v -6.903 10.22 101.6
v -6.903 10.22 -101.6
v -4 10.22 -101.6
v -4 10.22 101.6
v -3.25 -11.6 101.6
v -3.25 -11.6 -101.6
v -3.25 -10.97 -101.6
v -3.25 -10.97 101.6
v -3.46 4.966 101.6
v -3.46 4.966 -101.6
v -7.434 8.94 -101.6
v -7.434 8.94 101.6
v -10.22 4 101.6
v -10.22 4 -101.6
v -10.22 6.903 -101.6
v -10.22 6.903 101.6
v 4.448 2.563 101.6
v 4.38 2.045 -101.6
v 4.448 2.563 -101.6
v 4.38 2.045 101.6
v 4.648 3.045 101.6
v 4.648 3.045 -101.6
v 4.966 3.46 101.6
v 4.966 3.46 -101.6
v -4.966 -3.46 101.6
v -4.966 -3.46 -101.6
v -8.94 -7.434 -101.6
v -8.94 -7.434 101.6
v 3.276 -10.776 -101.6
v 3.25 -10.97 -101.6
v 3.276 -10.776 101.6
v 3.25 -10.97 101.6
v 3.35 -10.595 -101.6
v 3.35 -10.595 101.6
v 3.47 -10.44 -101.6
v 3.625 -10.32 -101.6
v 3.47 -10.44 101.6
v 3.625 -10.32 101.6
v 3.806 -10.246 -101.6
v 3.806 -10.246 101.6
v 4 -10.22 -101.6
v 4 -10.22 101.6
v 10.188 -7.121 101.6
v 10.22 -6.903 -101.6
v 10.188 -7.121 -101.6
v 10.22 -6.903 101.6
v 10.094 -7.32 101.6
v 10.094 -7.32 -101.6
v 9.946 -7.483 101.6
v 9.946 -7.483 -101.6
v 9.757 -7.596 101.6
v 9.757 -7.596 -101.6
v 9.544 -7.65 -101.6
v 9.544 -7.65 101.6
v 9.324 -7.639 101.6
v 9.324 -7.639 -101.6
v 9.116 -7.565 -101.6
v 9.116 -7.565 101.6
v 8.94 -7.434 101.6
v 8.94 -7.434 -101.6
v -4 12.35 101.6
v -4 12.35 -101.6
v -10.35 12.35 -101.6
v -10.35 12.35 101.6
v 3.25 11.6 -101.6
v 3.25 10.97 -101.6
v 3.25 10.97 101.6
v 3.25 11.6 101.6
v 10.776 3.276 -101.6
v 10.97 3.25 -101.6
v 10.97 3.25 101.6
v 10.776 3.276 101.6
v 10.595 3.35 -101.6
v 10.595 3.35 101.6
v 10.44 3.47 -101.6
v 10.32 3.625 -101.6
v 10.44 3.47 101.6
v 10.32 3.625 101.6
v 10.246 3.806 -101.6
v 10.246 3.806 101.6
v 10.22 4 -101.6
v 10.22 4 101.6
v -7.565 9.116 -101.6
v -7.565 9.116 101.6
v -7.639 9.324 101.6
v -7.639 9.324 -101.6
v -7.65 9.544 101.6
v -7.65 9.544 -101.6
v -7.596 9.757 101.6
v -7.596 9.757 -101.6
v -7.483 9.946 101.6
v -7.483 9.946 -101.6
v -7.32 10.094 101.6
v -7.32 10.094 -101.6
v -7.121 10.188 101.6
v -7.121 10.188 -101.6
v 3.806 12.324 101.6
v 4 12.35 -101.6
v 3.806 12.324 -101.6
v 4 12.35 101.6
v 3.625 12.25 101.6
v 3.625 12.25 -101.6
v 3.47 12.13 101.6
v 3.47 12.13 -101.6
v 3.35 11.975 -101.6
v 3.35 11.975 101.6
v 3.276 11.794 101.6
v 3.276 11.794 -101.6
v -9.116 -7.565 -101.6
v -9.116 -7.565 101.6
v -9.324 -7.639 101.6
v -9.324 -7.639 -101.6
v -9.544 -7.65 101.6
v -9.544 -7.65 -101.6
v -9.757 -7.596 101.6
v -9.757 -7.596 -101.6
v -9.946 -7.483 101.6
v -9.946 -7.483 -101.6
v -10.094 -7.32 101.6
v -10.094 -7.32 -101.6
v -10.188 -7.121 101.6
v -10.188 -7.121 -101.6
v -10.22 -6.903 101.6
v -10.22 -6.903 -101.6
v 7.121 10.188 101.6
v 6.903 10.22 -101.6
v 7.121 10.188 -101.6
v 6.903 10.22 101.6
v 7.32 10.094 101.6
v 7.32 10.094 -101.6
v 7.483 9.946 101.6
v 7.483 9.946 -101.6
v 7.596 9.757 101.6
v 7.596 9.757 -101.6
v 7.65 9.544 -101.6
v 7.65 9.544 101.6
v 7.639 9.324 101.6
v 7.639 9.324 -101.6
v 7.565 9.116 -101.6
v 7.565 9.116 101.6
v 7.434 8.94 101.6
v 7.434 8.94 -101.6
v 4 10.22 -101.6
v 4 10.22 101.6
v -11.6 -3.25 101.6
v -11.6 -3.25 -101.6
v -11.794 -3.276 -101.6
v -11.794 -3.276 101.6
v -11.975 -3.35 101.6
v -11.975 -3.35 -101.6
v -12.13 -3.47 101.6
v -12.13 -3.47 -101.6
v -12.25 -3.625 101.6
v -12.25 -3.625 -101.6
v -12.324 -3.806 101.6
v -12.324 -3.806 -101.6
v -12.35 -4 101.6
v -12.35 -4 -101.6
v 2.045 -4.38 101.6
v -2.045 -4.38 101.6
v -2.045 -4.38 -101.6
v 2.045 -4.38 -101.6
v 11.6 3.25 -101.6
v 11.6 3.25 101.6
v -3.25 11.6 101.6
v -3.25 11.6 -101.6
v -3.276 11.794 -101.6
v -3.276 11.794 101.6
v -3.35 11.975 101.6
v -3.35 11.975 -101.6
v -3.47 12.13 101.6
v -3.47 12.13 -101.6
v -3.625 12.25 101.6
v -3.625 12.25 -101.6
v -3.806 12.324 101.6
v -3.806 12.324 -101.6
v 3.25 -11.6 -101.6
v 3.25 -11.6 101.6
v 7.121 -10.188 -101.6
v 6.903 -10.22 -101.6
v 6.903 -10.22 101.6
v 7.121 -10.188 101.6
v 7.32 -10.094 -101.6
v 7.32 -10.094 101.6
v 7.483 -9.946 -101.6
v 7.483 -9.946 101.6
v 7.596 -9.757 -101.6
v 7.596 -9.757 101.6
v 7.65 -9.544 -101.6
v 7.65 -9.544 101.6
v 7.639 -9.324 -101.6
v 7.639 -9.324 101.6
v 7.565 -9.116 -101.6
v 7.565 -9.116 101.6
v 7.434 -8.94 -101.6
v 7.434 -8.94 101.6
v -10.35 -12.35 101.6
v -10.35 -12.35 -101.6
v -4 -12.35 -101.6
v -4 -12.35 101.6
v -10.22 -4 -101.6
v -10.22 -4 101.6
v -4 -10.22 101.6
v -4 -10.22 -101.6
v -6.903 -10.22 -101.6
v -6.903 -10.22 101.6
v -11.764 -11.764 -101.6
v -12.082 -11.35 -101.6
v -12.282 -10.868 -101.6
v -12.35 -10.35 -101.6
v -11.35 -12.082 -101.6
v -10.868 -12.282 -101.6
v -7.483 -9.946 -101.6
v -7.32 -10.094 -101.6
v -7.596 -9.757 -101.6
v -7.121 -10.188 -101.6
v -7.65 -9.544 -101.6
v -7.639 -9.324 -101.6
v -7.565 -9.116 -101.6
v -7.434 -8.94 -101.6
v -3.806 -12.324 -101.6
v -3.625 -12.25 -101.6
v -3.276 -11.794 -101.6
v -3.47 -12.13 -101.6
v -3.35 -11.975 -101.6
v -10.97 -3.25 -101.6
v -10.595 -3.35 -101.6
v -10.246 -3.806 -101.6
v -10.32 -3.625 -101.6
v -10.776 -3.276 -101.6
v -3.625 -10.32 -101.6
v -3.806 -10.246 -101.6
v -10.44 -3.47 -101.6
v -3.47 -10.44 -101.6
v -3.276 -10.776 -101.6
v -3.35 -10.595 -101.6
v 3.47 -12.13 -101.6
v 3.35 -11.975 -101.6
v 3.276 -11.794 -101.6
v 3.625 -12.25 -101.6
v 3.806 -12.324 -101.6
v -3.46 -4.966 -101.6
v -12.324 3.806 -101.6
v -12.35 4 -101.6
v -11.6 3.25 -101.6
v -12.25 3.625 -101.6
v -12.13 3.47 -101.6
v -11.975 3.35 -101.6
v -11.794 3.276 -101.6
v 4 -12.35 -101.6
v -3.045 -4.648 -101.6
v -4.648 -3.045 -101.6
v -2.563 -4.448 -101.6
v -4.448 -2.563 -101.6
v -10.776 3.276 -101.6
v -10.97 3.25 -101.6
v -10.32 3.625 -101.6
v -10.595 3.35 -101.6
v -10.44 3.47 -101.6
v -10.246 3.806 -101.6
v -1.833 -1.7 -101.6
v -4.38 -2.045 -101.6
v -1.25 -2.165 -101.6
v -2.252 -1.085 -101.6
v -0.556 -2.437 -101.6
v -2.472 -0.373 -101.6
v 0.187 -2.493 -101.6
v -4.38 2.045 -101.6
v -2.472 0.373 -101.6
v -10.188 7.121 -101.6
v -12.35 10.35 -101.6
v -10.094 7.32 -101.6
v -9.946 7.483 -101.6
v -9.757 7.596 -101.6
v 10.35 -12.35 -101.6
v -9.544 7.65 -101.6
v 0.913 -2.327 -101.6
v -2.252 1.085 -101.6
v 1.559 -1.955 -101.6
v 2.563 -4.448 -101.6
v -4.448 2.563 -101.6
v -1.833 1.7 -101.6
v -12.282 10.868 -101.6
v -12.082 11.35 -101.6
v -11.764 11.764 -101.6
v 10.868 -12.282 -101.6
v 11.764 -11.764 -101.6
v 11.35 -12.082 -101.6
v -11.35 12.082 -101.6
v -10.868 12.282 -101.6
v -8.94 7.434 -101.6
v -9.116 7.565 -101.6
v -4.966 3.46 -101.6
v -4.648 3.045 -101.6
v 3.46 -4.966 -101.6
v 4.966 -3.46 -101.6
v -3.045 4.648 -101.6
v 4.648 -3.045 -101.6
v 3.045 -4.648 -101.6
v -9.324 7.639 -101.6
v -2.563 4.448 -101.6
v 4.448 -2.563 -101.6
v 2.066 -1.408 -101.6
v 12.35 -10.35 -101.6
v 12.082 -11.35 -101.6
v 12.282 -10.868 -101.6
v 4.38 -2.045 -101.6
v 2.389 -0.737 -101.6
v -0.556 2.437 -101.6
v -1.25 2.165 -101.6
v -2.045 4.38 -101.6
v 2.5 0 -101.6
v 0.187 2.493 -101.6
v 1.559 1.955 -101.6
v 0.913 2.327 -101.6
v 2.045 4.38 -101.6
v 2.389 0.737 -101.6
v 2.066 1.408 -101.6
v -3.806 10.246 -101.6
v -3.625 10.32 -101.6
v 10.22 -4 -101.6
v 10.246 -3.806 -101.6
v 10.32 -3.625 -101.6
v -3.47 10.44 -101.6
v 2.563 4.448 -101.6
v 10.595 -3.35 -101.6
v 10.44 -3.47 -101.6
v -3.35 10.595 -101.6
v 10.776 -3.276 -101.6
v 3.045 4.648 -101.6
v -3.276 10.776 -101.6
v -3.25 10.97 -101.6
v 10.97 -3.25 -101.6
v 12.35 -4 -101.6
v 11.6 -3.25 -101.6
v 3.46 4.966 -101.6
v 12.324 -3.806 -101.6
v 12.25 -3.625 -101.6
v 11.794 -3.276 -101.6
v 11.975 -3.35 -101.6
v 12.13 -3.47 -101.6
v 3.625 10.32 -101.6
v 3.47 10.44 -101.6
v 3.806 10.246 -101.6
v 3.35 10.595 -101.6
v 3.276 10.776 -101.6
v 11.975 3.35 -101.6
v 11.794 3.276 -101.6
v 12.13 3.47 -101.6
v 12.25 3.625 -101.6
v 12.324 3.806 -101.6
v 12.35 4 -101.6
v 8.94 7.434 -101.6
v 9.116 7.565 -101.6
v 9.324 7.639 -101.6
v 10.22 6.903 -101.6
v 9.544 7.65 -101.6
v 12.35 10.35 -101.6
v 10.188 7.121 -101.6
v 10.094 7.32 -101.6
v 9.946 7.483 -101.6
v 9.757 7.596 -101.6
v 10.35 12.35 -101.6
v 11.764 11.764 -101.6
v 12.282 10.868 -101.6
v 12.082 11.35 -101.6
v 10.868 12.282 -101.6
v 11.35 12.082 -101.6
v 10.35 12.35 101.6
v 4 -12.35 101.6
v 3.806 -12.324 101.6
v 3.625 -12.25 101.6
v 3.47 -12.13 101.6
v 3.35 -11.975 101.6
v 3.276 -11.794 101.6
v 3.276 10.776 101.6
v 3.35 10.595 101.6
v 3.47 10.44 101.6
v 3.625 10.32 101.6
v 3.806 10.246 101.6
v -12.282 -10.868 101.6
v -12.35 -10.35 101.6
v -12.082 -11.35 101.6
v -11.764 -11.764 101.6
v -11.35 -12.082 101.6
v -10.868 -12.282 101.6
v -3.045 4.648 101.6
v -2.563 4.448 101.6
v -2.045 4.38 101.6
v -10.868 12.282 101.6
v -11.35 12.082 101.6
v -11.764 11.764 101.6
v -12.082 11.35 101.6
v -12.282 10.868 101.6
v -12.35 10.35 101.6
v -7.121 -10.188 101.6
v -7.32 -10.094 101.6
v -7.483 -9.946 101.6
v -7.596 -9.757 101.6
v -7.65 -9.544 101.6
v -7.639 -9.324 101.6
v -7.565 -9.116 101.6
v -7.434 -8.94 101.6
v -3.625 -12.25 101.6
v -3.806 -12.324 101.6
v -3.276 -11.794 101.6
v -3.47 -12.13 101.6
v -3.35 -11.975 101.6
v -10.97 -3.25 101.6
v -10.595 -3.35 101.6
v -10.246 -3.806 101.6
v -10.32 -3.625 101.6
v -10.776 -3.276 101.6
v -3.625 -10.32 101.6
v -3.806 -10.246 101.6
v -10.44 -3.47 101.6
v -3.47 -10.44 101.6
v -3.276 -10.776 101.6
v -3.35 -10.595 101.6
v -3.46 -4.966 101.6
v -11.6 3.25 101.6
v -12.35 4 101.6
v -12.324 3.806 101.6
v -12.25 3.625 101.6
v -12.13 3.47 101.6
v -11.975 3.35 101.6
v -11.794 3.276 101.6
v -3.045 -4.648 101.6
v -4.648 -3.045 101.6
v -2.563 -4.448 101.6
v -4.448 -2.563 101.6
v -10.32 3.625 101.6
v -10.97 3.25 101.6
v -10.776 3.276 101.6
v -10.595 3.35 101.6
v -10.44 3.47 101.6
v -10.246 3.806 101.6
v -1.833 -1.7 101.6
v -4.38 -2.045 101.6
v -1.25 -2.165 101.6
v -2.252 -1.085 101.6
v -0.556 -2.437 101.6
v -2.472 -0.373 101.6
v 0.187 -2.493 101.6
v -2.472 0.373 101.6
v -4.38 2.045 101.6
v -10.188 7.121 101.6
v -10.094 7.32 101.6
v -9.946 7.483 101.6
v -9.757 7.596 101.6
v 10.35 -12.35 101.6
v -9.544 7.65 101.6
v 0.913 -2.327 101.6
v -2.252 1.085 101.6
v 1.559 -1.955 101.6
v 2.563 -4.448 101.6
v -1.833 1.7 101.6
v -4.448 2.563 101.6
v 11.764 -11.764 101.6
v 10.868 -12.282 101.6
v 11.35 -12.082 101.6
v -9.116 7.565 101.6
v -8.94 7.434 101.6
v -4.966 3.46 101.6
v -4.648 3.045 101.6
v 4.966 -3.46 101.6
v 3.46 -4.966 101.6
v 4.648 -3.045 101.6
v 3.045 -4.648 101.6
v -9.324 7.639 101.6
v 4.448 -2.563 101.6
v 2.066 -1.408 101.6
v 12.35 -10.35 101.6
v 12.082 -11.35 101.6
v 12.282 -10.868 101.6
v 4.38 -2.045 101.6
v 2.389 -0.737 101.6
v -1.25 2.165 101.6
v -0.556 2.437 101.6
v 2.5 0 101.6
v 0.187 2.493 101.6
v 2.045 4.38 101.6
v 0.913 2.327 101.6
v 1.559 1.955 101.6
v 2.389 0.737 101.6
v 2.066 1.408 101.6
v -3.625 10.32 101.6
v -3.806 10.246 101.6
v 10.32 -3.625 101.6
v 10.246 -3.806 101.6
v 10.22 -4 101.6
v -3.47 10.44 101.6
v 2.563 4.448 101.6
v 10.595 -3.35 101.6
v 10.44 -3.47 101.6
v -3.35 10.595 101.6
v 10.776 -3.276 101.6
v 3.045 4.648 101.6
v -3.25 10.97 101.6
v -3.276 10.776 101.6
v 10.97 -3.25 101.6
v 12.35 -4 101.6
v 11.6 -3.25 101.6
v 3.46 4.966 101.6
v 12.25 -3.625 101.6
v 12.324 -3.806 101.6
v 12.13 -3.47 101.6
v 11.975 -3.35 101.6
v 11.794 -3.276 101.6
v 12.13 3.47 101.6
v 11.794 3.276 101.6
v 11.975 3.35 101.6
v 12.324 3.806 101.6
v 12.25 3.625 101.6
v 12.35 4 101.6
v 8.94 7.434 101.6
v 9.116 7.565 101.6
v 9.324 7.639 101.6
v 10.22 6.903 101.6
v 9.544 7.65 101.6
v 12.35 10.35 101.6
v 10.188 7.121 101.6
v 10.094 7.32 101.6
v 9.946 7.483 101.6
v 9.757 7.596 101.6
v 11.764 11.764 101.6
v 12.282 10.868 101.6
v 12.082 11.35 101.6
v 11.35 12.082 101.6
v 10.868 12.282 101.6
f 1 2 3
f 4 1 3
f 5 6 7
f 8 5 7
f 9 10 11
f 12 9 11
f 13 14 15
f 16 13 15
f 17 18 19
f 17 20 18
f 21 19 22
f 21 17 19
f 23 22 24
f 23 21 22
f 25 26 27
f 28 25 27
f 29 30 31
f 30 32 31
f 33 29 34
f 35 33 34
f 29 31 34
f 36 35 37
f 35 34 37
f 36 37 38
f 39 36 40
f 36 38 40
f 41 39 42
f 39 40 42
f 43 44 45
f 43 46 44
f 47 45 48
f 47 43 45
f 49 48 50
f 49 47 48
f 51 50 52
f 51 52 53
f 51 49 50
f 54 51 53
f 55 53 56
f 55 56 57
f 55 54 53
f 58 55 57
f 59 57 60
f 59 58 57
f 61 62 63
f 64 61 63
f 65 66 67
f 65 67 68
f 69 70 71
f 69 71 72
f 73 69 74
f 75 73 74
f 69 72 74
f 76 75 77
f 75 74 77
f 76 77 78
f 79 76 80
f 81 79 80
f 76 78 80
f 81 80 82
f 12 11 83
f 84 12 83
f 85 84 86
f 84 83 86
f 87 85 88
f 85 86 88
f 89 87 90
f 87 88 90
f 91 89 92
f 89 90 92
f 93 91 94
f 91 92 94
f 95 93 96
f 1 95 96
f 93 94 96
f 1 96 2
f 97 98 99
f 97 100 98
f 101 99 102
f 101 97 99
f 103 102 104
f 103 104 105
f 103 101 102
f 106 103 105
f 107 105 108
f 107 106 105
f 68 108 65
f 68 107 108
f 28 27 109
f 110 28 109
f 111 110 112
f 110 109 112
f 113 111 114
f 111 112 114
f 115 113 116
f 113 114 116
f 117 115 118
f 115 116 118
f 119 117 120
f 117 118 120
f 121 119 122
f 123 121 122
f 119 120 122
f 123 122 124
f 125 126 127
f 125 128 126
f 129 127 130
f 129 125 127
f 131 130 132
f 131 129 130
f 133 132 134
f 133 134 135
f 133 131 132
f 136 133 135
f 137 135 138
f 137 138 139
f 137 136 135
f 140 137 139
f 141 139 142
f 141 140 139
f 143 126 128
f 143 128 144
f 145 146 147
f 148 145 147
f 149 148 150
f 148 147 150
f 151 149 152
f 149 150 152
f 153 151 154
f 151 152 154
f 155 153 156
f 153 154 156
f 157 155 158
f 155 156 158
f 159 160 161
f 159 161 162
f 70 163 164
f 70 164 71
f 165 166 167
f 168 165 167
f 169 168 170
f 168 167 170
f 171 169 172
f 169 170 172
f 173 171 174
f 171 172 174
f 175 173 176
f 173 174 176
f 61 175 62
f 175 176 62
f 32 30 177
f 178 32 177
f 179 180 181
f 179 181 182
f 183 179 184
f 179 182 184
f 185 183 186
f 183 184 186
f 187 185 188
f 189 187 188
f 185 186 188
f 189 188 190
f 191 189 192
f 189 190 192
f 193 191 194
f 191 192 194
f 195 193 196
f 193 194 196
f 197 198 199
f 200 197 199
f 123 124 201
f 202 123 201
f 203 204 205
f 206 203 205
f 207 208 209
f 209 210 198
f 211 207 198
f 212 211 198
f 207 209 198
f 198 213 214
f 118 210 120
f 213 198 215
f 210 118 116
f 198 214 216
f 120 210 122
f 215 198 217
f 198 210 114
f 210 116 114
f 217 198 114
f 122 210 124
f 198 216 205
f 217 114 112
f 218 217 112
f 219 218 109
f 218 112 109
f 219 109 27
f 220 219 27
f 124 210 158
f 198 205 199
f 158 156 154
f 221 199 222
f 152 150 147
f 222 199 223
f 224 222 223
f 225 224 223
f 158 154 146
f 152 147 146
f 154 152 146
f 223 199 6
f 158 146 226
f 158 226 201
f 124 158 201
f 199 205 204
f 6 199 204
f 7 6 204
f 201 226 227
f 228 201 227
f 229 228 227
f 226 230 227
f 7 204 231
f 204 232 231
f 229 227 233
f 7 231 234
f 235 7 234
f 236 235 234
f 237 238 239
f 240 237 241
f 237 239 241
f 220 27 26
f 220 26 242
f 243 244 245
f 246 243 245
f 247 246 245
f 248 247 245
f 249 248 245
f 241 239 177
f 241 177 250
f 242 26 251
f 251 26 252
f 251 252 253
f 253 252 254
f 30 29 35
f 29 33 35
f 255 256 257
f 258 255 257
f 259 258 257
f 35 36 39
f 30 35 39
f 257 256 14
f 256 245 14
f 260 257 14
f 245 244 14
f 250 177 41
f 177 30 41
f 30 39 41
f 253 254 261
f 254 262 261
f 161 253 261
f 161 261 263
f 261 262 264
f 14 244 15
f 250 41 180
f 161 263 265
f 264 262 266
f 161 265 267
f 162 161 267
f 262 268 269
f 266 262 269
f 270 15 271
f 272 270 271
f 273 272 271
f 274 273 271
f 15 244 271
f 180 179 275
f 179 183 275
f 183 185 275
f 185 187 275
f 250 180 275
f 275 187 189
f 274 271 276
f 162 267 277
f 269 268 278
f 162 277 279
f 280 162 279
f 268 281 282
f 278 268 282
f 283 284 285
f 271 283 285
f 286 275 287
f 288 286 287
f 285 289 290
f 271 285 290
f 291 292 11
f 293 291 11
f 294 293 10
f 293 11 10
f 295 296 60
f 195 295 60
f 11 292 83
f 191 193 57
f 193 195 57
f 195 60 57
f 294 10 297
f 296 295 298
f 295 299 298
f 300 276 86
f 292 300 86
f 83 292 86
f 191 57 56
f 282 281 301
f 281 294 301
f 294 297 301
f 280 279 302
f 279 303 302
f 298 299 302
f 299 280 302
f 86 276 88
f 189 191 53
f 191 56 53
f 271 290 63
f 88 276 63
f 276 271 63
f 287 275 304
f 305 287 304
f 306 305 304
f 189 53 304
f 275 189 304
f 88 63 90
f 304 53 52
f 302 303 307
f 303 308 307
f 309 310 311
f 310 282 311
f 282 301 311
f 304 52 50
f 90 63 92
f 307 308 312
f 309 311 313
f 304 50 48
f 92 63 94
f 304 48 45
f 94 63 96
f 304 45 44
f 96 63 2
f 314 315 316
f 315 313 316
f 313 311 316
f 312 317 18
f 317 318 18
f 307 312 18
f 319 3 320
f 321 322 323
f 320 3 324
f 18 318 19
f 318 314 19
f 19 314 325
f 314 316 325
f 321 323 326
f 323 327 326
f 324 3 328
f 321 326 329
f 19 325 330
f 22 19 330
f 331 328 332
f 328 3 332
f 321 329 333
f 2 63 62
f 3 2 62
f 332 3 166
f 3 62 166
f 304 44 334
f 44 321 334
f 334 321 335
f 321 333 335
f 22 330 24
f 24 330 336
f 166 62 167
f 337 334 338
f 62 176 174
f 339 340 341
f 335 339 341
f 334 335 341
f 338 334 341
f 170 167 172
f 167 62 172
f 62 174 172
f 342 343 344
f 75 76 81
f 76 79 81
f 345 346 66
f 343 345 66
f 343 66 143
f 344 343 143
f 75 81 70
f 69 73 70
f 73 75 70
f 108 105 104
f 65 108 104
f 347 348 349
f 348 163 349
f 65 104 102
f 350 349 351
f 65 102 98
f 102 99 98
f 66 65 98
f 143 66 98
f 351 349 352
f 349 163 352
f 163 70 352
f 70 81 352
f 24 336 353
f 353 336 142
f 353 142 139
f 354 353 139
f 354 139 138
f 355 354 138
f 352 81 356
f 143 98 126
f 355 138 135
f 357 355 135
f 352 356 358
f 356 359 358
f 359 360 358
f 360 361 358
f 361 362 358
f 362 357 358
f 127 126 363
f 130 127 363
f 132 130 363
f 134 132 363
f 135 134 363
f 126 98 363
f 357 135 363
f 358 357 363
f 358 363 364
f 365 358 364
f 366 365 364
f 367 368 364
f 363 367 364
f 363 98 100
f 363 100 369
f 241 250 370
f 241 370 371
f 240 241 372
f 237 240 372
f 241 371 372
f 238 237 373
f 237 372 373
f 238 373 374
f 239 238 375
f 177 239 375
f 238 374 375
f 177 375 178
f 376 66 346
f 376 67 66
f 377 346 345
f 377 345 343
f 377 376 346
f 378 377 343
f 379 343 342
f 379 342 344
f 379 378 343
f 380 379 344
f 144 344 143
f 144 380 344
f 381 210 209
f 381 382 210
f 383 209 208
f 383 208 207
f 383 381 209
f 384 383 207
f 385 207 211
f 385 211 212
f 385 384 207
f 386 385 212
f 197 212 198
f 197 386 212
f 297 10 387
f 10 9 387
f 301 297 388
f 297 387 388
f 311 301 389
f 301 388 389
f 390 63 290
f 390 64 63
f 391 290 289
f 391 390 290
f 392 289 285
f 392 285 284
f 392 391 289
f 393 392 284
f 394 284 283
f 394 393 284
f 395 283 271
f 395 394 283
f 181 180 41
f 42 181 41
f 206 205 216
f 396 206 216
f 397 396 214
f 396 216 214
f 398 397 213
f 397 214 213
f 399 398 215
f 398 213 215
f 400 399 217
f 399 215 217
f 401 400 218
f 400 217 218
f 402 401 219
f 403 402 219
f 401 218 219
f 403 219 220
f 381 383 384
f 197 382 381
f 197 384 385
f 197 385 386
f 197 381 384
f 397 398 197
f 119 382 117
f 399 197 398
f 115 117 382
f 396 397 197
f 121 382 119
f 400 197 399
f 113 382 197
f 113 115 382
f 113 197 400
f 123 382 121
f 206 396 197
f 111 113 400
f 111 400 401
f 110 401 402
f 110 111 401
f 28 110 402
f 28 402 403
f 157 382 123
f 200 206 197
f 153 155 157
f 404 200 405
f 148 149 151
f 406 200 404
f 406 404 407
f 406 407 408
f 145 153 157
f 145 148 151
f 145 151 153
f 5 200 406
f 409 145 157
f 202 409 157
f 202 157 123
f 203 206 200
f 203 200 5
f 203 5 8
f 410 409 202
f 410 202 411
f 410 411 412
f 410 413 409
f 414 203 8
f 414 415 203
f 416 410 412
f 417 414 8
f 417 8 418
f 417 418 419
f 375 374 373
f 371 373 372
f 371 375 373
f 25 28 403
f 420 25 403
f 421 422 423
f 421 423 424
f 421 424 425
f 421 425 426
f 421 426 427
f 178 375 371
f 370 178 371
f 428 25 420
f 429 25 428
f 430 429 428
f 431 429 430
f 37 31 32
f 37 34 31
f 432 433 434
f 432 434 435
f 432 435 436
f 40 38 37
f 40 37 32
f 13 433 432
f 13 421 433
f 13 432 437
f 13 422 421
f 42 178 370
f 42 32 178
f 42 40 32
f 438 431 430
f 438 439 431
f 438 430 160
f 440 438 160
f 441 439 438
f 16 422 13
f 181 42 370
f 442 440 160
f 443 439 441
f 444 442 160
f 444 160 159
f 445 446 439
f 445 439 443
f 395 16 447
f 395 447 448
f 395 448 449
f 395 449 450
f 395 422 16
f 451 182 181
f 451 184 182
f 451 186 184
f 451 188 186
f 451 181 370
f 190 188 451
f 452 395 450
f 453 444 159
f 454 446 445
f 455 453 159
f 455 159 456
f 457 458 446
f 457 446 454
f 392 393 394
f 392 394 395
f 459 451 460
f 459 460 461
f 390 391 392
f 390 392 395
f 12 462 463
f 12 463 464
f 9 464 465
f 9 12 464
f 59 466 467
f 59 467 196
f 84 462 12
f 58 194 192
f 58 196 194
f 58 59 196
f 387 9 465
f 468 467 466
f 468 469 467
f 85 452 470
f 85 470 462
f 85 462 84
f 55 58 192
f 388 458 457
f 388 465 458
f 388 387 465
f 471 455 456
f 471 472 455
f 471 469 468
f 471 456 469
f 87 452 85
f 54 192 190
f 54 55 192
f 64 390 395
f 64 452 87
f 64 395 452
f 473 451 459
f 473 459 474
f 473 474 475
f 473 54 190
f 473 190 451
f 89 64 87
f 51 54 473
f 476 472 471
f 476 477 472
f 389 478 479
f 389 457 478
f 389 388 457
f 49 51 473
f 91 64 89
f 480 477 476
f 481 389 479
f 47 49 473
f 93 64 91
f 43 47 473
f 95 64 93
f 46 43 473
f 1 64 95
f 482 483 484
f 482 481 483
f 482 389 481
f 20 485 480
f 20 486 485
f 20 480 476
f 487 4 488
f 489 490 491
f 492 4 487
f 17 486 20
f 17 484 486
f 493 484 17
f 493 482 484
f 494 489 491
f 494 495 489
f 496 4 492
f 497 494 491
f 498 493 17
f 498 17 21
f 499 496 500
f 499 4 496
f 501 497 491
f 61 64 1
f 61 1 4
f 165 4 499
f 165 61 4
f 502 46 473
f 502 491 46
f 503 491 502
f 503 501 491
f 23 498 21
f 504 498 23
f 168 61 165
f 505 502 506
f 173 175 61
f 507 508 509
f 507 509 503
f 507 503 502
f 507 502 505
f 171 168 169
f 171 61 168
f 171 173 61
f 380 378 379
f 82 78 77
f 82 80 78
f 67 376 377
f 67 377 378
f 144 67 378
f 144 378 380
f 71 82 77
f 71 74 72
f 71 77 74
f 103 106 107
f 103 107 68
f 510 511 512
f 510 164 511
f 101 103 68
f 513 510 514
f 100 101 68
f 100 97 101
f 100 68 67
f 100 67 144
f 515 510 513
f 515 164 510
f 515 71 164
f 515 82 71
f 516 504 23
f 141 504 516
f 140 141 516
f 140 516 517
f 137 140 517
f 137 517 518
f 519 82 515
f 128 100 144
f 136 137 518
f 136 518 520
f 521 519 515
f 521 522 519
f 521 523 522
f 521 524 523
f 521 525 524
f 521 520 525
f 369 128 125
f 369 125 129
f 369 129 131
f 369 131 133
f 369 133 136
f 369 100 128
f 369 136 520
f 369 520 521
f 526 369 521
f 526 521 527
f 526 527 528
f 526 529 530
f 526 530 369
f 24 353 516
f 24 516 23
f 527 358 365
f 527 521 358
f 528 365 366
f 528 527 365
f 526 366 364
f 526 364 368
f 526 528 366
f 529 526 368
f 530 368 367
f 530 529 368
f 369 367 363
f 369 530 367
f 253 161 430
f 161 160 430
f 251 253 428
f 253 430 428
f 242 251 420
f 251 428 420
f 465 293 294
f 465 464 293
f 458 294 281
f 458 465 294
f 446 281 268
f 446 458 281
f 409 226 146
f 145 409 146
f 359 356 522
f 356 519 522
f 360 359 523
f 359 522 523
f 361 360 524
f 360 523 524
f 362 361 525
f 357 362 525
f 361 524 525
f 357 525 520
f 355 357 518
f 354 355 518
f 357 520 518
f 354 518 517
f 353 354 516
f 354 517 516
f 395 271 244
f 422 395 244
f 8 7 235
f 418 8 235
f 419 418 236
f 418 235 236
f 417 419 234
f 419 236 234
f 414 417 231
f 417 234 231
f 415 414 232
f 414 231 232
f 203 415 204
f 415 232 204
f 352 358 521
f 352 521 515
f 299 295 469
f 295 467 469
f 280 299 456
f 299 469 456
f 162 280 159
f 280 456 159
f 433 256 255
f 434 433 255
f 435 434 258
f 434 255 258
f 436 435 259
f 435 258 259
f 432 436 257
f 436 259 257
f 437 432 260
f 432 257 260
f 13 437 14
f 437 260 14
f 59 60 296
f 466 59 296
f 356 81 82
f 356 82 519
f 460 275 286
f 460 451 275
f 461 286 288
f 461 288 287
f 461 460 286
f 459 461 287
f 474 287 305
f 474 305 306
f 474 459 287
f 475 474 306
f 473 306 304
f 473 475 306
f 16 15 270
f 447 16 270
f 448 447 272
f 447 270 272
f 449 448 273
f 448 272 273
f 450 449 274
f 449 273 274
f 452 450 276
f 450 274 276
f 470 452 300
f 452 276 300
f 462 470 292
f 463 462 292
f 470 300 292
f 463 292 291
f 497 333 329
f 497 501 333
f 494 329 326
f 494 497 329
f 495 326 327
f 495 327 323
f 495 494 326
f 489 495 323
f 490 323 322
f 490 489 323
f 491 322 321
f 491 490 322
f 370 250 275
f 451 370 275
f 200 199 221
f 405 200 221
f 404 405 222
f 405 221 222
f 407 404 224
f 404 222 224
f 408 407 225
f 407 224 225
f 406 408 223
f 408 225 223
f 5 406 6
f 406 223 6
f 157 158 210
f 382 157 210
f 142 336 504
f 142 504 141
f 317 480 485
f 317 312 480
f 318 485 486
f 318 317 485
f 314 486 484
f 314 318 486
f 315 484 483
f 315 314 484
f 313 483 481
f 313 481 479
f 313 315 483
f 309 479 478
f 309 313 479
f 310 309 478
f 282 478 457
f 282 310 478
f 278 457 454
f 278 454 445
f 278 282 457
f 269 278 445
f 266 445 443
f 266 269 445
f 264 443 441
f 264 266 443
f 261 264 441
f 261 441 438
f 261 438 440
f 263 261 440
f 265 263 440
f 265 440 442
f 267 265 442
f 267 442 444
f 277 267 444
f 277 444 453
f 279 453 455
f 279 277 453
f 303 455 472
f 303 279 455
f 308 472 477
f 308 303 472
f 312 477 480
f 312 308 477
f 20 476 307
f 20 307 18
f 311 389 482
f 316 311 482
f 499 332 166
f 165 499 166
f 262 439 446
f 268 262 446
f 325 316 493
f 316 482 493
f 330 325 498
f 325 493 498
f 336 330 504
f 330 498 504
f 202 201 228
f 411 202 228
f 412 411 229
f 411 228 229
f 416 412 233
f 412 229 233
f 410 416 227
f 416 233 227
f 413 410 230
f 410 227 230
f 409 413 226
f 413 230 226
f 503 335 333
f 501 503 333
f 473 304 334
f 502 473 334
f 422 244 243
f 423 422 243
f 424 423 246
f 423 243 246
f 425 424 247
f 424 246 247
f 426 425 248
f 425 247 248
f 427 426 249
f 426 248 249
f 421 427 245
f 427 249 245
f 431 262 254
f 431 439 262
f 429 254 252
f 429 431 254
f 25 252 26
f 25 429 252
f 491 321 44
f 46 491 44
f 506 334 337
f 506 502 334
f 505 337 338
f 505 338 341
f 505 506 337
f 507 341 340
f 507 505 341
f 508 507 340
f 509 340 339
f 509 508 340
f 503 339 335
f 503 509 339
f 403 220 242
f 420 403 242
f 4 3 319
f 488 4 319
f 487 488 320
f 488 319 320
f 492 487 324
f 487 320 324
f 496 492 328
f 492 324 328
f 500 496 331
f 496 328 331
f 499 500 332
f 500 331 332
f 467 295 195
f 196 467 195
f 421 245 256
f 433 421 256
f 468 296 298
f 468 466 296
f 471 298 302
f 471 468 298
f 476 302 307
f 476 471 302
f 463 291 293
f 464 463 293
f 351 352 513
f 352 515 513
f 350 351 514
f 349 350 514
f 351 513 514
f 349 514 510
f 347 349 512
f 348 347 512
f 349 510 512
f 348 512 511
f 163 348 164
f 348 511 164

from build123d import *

# Parameters (mm, degrees)
SKETCH2_W            = 8.76
SKETCH2_H            = 8.76
SKETCH2_R            = 2.5
BOSS_EXTRUDE1_DEPTH  = 101.6
BOSS_EXTRUDE2_START  = -101.6
BOSS_EXTRUDE2_DEPTH  = 203.2
FILLET1_R            = 0.75
FILLET1_OF_MIRROR1_R = 0.75
MIRROR2_START        = -101.6
MIRROR2_DEPTH        = 203.2
FILLET2_R            = 2


# Read off the part's stored shape, not the designer's step: Mirror2
with BuildPart() as part:
    # Sketch2 → Boss-Extrude1 (new, symmetric)
    with BuildSketch(Plane.XY):
        Rectangle(SKETCH2_W, SKETCH2_H)
        Circle(SKETCH2_R, mode=Mode.SUBTRACT)
    extrude(amount=BOSS_EXTRUDE1_DEPTH, both=True)

    # Sketch3 → Boss-Extrude2 (add)
    with BuildSketch(Plane.XY.offset(BOSS_EXTRUDE2_START)):
        Polygon((3.25, 12.35), (12.35, 12.35), (12.35, 3.25), (10.22, 3.25), (10.22, 8.713862556), (4.38, 2.873862556), (4.38, 4.38), (2.873862556, 4.38), (8.713862556, 10.22), (3.25, 10.22), align=None)
    boss_extrude2 = extrude(amount=BOSS_EXTRUDE2_DEPTH)

    # Fillet1
    fillet1_edges = [part.edges().sort_by_distance(p)[0] for p in [
        (3.25, 12.35, 0),
        (3.25, 10.22, 0),
        (8.713862556, 10.22, 0),
        (10.22, 8.713862556, 0),
        (10.22, 3.25, 0),
        (12.35, 3.25, 0),
    ]]
    fillet(fillet1_edges, radius=FILLET1_R)

    # Mirror1: Boss-Extrude2 across plane
    add(boss_extrude2.mirror(Plane.ZX))

    # Fillet1 of Mirror1
    fillet1_of_mirror1_edges = [part.edges().sort_by_distance(p)[0] for p in [
        (3.25, -12.35, 0),
        (3.25, -10.22, 0),
        (8.713862556, -10.22, 0),
        (10.22, -8.713862556, 0),
        (10.22, -3.25, 0),
        (12.35, -3.25, 0),
    ]]
    fillet(fillet1_of_mirror1_edges, radius=FILLET1_OF_MIRROR1_R)

    # Mirror2 outline → Mirror2 (add)
    with BuildSketch(Plane.XY.offset(MIRROR2_START)):
        with BuildLine():
            ThreePointArc((-7.43353247, 8.939669914), (-7.596112034, 9.757012574), (-6.903202384, 10.22))
            Line((-6.903202384, 10.22), (-4, 10.22))
            ThreePointArc((-4, 10.22), (-3.469669914, 10.439669914), (-3.25, 10.97))
            Line((-3.25, 10.97), (-3.25, 11.6))
            ThreePointArc((-3.25, 11.6), (-3.469669914, 12.130330086), (-4, 12.35))
            Line((-4, 12.35), (-12.35, 12.35))
            Line((-12.35, 12.35), (-12.35, 4))
            ThreePointArc((-12.35, 4), (-12.130330086, 3.469669914), (-11.6, 3.25))
            Line((-11.6, 3.25), (-10.97, 3.25))
            ThreePointArc((-10.97, 3.25), (-10.439669914, 3.469669914), (-10.22, 4))
            Line((-10.22, 4), (-10.22, 6.903202384))
            ThreePointArc((-10.22, 6.903202384), (-9.757012574, 7.596112034), (-8.939669914, 7.43353247))
            Line((-8.939669914, 7.43353247), (-4.38, 2.873862556))
            Line((-4.38, 2.873862556), (-4.38, 4.38))
            Line((-4.38, 4.38), (-2.873862556, 4.38))
            Line((-2.873862556, 4.38), (-7.43353247, 8.939669914))
        make_face()
        with BuildLine():
            Line((-4.38, -4.38), (-4.38, -2.873862556))
            Line((-4.38, -2.873862556), (-8.939669914, -7.43353247))
            ThreePointArc((-8.939669914, -7.43353247), (-9.757012574, -7.596112034), (-10.22, -6.903202384))
            Line((-10.22, -6.903202384), (-10.22, -4))
            ThreePointArc((-10.22, -4), (-10.439669914, -3.469669914), (-10.97, -3.25))
            Line((-10.97, -3.25), (-11.6, -3.25))
            ThreePointArc((-11.6, -3.25), (-12.130330086, -3.469669914), (-12.35, -4))
            Line((-12.35, -4), (-12.35, -12.35))
            Line((-12.35, -12.35), (-4, -12.35))
            ThreePointArc((-4, -12.35), (-3.469669914, -12.130330086), (-3.25, -11.6))
            Line((-3.25, -11.6), (-3.25, -10.97))
            ThreePointArc((-3.25, -10.97), (-3.469669914, -10.439669914), (-4, -10.22))
            Line((-4, -10.22), (-6.903202384, -10.22))
            ThreePointArc((-6.903202384, -10.22), (-7.596112034, -9.757012574), (-7.43353247, -8.939669914))
            Line((-7.43353247, -8.939669914), (-2.873862556, -4.38))
            Line((-2.873862556, -4.38), (-4.38, -4.38))
        make_face()
    extrude(amount=MIRROR2_DEPTH)

    # Fillet2
    fillet2_edges = [part.edges().sort_by_distance(p)[0] for p in [
        (-2.873862556, -4.38, 0),
        (-4.38, -2.873862556, 0),
        (-12.35, -12.35, 0),
        (2.873862556, 4.38, 0),
        (4.38, 2.873862556, 0),
        (12.35, 12.35, 0),
        (-2.873862556, 4.38, 0),
        (-4.38, 2.873862556, 0),
        (-12.35, 12.35, 0),
        (2.873862556, -4.38, 0),
        (4.38, -2.873862556, 0),
        (12.35, -12.35, 0),
    ]]
    fillet(fillet2_edges, radius=FILLET2_R)


solid = part.part
